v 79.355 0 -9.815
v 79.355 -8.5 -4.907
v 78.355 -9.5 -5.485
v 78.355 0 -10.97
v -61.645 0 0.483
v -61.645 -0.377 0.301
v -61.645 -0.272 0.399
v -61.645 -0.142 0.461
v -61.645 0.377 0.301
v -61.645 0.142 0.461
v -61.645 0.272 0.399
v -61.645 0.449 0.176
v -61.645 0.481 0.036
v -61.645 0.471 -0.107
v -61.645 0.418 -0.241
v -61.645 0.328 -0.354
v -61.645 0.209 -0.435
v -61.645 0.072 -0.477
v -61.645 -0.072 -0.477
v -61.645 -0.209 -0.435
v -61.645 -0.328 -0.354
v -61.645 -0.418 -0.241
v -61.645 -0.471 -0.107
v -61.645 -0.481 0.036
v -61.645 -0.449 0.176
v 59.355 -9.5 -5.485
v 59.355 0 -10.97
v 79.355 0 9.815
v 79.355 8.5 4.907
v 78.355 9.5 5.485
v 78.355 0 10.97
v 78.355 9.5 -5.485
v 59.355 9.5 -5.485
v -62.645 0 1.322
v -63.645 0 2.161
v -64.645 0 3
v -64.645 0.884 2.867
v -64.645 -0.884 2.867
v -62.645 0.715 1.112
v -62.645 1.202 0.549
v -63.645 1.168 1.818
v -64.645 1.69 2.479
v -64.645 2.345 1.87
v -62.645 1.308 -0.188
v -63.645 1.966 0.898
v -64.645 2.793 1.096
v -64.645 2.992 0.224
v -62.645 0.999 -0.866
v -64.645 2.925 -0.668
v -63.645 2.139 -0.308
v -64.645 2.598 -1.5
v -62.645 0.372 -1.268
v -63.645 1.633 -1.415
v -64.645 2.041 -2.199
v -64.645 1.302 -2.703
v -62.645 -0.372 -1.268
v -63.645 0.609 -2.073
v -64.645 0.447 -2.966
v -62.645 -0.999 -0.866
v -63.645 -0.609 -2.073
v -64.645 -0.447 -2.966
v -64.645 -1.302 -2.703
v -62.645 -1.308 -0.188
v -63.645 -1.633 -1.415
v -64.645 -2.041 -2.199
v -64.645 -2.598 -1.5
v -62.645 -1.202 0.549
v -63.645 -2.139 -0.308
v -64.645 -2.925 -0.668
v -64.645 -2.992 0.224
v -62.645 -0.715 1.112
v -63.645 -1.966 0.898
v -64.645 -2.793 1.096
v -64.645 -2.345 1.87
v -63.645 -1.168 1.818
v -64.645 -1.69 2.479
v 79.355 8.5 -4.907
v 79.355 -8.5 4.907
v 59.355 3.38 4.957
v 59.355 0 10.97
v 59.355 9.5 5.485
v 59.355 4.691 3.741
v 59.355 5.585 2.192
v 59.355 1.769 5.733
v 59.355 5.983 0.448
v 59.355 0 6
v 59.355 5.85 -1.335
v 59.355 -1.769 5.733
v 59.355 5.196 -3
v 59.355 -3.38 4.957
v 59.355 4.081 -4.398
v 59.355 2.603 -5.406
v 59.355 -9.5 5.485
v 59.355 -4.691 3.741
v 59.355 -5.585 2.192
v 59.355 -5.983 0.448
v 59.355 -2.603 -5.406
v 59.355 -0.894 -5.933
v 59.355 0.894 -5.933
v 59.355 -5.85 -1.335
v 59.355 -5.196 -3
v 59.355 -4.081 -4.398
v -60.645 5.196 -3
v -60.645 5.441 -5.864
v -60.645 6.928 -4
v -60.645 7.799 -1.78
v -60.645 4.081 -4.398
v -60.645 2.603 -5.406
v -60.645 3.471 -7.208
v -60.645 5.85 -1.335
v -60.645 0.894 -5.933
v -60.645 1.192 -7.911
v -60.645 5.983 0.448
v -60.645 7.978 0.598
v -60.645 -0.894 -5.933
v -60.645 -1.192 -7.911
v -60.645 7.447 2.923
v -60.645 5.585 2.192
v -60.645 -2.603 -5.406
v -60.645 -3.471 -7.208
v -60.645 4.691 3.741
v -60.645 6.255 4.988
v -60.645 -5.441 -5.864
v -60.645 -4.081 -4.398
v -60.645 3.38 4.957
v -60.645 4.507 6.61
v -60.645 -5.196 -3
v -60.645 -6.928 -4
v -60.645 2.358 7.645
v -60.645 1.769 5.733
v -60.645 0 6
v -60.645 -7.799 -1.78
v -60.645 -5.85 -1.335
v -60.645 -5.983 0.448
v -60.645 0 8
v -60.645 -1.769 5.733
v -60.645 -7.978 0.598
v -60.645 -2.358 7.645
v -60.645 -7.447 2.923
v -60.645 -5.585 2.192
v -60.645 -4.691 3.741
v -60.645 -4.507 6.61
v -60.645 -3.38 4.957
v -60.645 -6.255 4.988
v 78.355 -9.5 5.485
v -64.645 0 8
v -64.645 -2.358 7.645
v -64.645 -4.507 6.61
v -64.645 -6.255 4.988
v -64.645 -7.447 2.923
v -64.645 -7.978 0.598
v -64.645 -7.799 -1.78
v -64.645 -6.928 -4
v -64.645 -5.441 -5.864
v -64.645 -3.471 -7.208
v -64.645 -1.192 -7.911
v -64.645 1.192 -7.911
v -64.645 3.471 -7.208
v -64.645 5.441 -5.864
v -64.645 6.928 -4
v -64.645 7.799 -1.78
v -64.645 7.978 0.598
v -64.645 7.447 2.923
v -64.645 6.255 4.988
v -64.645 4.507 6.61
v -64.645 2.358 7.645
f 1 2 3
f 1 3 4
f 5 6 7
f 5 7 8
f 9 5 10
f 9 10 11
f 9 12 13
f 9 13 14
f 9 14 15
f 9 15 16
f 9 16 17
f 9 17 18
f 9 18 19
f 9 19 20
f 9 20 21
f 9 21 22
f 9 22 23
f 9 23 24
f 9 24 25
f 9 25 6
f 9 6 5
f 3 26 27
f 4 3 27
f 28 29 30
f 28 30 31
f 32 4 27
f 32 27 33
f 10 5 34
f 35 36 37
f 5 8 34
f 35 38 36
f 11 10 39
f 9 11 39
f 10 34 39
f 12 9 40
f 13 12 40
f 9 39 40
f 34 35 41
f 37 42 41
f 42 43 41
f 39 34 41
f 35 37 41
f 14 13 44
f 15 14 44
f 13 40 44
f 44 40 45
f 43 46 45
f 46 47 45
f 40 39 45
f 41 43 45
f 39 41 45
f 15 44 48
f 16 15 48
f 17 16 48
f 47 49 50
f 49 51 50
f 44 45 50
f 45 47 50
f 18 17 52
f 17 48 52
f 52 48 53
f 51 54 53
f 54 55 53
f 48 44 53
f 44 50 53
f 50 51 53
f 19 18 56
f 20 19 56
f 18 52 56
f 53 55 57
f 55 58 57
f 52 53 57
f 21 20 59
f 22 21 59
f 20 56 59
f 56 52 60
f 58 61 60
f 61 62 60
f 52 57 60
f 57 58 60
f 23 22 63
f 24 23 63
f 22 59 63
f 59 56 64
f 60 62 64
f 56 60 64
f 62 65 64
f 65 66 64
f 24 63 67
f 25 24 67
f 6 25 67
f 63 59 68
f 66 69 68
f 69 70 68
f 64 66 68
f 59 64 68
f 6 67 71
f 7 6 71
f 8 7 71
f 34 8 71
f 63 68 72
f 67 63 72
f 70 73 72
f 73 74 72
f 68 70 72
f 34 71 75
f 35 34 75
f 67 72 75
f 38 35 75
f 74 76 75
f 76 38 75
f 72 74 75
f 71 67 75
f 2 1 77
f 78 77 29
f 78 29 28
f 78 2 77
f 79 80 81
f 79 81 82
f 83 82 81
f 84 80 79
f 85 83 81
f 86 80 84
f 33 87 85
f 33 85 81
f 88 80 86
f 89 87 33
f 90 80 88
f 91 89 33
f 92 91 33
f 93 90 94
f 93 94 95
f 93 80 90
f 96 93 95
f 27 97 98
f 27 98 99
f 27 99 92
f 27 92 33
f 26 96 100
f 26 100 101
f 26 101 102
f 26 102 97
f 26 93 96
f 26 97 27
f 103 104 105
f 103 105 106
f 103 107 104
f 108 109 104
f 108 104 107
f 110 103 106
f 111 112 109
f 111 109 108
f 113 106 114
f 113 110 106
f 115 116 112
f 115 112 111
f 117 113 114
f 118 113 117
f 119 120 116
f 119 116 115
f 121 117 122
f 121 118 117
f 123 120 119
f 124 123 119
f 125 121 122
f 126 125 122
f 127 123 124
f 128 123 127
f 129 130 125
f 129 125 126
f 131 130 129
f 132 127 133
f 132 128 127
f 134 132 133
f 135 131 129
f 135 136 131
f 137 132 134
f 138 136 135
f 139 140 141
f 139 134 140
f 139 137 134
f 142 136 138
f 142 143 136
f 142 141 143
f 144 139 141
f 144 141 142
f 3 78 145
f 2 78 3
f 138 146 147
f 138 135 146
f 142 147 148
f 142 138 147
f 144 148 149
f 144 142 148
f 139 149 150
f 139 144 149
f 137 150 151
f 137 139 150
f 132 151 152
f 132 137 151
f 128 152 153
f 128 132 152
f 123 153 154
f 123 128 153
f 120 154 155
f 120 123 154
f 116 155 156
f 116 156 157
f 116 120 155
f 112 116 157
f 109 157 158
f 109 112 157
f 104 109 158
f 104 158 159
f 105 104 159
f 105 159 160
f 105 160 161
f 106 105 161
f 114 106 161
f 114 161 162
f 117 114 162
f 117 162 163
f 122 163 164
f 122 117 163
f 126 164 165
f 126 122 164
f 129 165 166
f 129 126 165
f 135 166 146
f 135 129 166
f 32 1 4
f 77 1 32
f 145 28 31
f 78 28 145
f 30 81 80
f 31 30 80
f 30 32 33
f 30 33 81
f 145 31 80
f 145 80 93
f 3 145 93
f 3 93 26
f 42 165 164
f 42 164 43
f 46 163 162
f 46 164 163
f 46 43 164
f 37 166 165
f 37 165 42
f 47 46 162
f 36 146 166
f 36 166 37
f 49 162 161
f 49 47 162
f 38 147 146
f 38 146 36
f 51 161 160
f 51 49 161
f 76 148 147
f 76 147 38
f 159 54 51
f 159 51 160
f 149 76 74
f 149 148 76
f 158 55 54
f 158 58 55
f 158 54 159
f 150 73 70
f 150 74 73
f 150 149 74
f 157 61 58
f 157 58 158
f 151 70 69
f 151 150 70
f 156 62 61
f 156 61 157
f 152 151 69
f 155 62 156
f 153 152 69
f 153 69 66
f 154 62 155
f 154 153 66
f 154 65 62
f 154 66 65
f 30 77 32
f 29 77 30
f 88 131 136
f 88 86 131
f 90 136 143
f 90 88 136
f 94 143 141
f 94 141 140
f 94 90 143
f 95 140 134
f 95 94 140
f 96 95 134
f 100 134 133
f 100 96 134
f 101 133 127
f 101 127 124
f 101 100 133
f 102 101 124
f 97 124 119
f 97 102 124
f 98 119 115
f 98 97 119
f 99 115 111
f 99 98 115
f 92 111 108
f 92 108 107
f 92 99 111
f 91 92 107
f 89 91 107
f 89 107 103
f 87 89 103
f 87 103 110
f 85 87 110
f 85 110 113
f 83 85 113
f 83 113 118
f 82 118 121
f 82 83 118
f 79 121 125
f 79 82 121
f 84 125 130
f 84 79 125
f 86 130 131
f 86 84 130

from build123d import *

# Parameters (mm, degrees)
SKETCH_2_OUTSIDE_W  = 53.464
SKETCH_2_OUTSIDE_H  = 53.464
CUT_EXTRUDE_1_DEPTH = 20
CHAMFER_1_SIZE      = 1
SKETCH_3_R          = 3
CUT_EXTRUDE_2_DEPTH = 3
CUT_EXTRUDE_2_DRAFT = -40


with BuildPart() as part:
    # Эскиз1 → Повернуть1 (revolve)
    with BuildSketch(Plane(origin=(0, 0, 0), x_dir=(1, 0, 0), z_dir=(0, 1, 0)), mode=Mode.PRIVATE) as revolve_1_sk:
        Polygon((-64.645142278, 0), (-64.645142278, 8), (-60.645142278, 8), (-60.645142278, 6), (59.354857722, 6), (59.354857722, 11), (79.354857722, 11), (79.354857722, 0), align=None)
    revolve(revolve_1_sk.sketch.rotate(Axis((-81.575248185, 0, 0), (1, 0, 0)), 180), axis=Axis((-81.575248185, 0, 0), (1, 0, 0)))

    # Эскиз2 outside → Вырез-Вытянуть1 (cut)
    with BuildSketch(Plane(origin=(79.354857722, 0, 0), x_dir=(0, 0, -1), z_dir=(1, 0, 0))):
        Rectangle(SKETCH_2_OUTSIDE_W, SKETCH_2_OUTSIDE_H)
        Polygon((10.969655115, 0), (5.484827557, 9.5), (-5.484827557, 9.5), (-10.969655115, 0), (-5.484827557, -9.5), (5.484827557, -9.5), align=None, mode=Mode.SUBTRACT)
    extrude(amount=-CUT_EXTRUDE_1_DEPTH, mode=Mode.SUBTRACT)

    # Фаска1
    chamfer_1_edges = [part.edges().sort_by_distance(p)[0] for p in [
        (79.354857722, -4.75, -8.227241336),
        (79.354857722, -9.5, 0),
        (79.354857722, -4.75, 8.227241336),
        (79.354857722, 4.75, 8.227241336),
        (79.354857722, 9.5, 0),
        (79.354857722, 4.75, -8.227241336),
    ]]
    chamfer(chamfer_1_edges, length=CHAMFER_1_SIZE)


with BuildPart() as cut_extrude_2_tool:
    # Эскиз3 → Вырез-Вытянуть2 (with draft: the straight prism first)
    with BuildSketch(Plane.ZY.offset(64.645142278)):
        Circle(SKETCH_3_R)
    extrude(amount=-CUT_EXTRUDE_2_DEPTH)
    # Вырез-Вытянуть2: the draft: its side faces are tilted about the plane it starts from
    cut_extrude_2_sides = [cut_extrude_2_tool.faces().sort_by_distance(p)[0] for p in [
        (-63.145142278, 0, -3),
    ]]
    draft(cut_extrude_2_sides, Plane.ZY.offset(64.645142278), CUT_EXTRUDE_2_DRAFT)


with BuildPart() as part_1:
    add(part.part)

    # Вырез-Вытянуть2: cut by cut_extrude_2_tool
    add(cut_extrude_2_tool.part, mode=Mode.SUBTRACT)


solid = part_1.part
